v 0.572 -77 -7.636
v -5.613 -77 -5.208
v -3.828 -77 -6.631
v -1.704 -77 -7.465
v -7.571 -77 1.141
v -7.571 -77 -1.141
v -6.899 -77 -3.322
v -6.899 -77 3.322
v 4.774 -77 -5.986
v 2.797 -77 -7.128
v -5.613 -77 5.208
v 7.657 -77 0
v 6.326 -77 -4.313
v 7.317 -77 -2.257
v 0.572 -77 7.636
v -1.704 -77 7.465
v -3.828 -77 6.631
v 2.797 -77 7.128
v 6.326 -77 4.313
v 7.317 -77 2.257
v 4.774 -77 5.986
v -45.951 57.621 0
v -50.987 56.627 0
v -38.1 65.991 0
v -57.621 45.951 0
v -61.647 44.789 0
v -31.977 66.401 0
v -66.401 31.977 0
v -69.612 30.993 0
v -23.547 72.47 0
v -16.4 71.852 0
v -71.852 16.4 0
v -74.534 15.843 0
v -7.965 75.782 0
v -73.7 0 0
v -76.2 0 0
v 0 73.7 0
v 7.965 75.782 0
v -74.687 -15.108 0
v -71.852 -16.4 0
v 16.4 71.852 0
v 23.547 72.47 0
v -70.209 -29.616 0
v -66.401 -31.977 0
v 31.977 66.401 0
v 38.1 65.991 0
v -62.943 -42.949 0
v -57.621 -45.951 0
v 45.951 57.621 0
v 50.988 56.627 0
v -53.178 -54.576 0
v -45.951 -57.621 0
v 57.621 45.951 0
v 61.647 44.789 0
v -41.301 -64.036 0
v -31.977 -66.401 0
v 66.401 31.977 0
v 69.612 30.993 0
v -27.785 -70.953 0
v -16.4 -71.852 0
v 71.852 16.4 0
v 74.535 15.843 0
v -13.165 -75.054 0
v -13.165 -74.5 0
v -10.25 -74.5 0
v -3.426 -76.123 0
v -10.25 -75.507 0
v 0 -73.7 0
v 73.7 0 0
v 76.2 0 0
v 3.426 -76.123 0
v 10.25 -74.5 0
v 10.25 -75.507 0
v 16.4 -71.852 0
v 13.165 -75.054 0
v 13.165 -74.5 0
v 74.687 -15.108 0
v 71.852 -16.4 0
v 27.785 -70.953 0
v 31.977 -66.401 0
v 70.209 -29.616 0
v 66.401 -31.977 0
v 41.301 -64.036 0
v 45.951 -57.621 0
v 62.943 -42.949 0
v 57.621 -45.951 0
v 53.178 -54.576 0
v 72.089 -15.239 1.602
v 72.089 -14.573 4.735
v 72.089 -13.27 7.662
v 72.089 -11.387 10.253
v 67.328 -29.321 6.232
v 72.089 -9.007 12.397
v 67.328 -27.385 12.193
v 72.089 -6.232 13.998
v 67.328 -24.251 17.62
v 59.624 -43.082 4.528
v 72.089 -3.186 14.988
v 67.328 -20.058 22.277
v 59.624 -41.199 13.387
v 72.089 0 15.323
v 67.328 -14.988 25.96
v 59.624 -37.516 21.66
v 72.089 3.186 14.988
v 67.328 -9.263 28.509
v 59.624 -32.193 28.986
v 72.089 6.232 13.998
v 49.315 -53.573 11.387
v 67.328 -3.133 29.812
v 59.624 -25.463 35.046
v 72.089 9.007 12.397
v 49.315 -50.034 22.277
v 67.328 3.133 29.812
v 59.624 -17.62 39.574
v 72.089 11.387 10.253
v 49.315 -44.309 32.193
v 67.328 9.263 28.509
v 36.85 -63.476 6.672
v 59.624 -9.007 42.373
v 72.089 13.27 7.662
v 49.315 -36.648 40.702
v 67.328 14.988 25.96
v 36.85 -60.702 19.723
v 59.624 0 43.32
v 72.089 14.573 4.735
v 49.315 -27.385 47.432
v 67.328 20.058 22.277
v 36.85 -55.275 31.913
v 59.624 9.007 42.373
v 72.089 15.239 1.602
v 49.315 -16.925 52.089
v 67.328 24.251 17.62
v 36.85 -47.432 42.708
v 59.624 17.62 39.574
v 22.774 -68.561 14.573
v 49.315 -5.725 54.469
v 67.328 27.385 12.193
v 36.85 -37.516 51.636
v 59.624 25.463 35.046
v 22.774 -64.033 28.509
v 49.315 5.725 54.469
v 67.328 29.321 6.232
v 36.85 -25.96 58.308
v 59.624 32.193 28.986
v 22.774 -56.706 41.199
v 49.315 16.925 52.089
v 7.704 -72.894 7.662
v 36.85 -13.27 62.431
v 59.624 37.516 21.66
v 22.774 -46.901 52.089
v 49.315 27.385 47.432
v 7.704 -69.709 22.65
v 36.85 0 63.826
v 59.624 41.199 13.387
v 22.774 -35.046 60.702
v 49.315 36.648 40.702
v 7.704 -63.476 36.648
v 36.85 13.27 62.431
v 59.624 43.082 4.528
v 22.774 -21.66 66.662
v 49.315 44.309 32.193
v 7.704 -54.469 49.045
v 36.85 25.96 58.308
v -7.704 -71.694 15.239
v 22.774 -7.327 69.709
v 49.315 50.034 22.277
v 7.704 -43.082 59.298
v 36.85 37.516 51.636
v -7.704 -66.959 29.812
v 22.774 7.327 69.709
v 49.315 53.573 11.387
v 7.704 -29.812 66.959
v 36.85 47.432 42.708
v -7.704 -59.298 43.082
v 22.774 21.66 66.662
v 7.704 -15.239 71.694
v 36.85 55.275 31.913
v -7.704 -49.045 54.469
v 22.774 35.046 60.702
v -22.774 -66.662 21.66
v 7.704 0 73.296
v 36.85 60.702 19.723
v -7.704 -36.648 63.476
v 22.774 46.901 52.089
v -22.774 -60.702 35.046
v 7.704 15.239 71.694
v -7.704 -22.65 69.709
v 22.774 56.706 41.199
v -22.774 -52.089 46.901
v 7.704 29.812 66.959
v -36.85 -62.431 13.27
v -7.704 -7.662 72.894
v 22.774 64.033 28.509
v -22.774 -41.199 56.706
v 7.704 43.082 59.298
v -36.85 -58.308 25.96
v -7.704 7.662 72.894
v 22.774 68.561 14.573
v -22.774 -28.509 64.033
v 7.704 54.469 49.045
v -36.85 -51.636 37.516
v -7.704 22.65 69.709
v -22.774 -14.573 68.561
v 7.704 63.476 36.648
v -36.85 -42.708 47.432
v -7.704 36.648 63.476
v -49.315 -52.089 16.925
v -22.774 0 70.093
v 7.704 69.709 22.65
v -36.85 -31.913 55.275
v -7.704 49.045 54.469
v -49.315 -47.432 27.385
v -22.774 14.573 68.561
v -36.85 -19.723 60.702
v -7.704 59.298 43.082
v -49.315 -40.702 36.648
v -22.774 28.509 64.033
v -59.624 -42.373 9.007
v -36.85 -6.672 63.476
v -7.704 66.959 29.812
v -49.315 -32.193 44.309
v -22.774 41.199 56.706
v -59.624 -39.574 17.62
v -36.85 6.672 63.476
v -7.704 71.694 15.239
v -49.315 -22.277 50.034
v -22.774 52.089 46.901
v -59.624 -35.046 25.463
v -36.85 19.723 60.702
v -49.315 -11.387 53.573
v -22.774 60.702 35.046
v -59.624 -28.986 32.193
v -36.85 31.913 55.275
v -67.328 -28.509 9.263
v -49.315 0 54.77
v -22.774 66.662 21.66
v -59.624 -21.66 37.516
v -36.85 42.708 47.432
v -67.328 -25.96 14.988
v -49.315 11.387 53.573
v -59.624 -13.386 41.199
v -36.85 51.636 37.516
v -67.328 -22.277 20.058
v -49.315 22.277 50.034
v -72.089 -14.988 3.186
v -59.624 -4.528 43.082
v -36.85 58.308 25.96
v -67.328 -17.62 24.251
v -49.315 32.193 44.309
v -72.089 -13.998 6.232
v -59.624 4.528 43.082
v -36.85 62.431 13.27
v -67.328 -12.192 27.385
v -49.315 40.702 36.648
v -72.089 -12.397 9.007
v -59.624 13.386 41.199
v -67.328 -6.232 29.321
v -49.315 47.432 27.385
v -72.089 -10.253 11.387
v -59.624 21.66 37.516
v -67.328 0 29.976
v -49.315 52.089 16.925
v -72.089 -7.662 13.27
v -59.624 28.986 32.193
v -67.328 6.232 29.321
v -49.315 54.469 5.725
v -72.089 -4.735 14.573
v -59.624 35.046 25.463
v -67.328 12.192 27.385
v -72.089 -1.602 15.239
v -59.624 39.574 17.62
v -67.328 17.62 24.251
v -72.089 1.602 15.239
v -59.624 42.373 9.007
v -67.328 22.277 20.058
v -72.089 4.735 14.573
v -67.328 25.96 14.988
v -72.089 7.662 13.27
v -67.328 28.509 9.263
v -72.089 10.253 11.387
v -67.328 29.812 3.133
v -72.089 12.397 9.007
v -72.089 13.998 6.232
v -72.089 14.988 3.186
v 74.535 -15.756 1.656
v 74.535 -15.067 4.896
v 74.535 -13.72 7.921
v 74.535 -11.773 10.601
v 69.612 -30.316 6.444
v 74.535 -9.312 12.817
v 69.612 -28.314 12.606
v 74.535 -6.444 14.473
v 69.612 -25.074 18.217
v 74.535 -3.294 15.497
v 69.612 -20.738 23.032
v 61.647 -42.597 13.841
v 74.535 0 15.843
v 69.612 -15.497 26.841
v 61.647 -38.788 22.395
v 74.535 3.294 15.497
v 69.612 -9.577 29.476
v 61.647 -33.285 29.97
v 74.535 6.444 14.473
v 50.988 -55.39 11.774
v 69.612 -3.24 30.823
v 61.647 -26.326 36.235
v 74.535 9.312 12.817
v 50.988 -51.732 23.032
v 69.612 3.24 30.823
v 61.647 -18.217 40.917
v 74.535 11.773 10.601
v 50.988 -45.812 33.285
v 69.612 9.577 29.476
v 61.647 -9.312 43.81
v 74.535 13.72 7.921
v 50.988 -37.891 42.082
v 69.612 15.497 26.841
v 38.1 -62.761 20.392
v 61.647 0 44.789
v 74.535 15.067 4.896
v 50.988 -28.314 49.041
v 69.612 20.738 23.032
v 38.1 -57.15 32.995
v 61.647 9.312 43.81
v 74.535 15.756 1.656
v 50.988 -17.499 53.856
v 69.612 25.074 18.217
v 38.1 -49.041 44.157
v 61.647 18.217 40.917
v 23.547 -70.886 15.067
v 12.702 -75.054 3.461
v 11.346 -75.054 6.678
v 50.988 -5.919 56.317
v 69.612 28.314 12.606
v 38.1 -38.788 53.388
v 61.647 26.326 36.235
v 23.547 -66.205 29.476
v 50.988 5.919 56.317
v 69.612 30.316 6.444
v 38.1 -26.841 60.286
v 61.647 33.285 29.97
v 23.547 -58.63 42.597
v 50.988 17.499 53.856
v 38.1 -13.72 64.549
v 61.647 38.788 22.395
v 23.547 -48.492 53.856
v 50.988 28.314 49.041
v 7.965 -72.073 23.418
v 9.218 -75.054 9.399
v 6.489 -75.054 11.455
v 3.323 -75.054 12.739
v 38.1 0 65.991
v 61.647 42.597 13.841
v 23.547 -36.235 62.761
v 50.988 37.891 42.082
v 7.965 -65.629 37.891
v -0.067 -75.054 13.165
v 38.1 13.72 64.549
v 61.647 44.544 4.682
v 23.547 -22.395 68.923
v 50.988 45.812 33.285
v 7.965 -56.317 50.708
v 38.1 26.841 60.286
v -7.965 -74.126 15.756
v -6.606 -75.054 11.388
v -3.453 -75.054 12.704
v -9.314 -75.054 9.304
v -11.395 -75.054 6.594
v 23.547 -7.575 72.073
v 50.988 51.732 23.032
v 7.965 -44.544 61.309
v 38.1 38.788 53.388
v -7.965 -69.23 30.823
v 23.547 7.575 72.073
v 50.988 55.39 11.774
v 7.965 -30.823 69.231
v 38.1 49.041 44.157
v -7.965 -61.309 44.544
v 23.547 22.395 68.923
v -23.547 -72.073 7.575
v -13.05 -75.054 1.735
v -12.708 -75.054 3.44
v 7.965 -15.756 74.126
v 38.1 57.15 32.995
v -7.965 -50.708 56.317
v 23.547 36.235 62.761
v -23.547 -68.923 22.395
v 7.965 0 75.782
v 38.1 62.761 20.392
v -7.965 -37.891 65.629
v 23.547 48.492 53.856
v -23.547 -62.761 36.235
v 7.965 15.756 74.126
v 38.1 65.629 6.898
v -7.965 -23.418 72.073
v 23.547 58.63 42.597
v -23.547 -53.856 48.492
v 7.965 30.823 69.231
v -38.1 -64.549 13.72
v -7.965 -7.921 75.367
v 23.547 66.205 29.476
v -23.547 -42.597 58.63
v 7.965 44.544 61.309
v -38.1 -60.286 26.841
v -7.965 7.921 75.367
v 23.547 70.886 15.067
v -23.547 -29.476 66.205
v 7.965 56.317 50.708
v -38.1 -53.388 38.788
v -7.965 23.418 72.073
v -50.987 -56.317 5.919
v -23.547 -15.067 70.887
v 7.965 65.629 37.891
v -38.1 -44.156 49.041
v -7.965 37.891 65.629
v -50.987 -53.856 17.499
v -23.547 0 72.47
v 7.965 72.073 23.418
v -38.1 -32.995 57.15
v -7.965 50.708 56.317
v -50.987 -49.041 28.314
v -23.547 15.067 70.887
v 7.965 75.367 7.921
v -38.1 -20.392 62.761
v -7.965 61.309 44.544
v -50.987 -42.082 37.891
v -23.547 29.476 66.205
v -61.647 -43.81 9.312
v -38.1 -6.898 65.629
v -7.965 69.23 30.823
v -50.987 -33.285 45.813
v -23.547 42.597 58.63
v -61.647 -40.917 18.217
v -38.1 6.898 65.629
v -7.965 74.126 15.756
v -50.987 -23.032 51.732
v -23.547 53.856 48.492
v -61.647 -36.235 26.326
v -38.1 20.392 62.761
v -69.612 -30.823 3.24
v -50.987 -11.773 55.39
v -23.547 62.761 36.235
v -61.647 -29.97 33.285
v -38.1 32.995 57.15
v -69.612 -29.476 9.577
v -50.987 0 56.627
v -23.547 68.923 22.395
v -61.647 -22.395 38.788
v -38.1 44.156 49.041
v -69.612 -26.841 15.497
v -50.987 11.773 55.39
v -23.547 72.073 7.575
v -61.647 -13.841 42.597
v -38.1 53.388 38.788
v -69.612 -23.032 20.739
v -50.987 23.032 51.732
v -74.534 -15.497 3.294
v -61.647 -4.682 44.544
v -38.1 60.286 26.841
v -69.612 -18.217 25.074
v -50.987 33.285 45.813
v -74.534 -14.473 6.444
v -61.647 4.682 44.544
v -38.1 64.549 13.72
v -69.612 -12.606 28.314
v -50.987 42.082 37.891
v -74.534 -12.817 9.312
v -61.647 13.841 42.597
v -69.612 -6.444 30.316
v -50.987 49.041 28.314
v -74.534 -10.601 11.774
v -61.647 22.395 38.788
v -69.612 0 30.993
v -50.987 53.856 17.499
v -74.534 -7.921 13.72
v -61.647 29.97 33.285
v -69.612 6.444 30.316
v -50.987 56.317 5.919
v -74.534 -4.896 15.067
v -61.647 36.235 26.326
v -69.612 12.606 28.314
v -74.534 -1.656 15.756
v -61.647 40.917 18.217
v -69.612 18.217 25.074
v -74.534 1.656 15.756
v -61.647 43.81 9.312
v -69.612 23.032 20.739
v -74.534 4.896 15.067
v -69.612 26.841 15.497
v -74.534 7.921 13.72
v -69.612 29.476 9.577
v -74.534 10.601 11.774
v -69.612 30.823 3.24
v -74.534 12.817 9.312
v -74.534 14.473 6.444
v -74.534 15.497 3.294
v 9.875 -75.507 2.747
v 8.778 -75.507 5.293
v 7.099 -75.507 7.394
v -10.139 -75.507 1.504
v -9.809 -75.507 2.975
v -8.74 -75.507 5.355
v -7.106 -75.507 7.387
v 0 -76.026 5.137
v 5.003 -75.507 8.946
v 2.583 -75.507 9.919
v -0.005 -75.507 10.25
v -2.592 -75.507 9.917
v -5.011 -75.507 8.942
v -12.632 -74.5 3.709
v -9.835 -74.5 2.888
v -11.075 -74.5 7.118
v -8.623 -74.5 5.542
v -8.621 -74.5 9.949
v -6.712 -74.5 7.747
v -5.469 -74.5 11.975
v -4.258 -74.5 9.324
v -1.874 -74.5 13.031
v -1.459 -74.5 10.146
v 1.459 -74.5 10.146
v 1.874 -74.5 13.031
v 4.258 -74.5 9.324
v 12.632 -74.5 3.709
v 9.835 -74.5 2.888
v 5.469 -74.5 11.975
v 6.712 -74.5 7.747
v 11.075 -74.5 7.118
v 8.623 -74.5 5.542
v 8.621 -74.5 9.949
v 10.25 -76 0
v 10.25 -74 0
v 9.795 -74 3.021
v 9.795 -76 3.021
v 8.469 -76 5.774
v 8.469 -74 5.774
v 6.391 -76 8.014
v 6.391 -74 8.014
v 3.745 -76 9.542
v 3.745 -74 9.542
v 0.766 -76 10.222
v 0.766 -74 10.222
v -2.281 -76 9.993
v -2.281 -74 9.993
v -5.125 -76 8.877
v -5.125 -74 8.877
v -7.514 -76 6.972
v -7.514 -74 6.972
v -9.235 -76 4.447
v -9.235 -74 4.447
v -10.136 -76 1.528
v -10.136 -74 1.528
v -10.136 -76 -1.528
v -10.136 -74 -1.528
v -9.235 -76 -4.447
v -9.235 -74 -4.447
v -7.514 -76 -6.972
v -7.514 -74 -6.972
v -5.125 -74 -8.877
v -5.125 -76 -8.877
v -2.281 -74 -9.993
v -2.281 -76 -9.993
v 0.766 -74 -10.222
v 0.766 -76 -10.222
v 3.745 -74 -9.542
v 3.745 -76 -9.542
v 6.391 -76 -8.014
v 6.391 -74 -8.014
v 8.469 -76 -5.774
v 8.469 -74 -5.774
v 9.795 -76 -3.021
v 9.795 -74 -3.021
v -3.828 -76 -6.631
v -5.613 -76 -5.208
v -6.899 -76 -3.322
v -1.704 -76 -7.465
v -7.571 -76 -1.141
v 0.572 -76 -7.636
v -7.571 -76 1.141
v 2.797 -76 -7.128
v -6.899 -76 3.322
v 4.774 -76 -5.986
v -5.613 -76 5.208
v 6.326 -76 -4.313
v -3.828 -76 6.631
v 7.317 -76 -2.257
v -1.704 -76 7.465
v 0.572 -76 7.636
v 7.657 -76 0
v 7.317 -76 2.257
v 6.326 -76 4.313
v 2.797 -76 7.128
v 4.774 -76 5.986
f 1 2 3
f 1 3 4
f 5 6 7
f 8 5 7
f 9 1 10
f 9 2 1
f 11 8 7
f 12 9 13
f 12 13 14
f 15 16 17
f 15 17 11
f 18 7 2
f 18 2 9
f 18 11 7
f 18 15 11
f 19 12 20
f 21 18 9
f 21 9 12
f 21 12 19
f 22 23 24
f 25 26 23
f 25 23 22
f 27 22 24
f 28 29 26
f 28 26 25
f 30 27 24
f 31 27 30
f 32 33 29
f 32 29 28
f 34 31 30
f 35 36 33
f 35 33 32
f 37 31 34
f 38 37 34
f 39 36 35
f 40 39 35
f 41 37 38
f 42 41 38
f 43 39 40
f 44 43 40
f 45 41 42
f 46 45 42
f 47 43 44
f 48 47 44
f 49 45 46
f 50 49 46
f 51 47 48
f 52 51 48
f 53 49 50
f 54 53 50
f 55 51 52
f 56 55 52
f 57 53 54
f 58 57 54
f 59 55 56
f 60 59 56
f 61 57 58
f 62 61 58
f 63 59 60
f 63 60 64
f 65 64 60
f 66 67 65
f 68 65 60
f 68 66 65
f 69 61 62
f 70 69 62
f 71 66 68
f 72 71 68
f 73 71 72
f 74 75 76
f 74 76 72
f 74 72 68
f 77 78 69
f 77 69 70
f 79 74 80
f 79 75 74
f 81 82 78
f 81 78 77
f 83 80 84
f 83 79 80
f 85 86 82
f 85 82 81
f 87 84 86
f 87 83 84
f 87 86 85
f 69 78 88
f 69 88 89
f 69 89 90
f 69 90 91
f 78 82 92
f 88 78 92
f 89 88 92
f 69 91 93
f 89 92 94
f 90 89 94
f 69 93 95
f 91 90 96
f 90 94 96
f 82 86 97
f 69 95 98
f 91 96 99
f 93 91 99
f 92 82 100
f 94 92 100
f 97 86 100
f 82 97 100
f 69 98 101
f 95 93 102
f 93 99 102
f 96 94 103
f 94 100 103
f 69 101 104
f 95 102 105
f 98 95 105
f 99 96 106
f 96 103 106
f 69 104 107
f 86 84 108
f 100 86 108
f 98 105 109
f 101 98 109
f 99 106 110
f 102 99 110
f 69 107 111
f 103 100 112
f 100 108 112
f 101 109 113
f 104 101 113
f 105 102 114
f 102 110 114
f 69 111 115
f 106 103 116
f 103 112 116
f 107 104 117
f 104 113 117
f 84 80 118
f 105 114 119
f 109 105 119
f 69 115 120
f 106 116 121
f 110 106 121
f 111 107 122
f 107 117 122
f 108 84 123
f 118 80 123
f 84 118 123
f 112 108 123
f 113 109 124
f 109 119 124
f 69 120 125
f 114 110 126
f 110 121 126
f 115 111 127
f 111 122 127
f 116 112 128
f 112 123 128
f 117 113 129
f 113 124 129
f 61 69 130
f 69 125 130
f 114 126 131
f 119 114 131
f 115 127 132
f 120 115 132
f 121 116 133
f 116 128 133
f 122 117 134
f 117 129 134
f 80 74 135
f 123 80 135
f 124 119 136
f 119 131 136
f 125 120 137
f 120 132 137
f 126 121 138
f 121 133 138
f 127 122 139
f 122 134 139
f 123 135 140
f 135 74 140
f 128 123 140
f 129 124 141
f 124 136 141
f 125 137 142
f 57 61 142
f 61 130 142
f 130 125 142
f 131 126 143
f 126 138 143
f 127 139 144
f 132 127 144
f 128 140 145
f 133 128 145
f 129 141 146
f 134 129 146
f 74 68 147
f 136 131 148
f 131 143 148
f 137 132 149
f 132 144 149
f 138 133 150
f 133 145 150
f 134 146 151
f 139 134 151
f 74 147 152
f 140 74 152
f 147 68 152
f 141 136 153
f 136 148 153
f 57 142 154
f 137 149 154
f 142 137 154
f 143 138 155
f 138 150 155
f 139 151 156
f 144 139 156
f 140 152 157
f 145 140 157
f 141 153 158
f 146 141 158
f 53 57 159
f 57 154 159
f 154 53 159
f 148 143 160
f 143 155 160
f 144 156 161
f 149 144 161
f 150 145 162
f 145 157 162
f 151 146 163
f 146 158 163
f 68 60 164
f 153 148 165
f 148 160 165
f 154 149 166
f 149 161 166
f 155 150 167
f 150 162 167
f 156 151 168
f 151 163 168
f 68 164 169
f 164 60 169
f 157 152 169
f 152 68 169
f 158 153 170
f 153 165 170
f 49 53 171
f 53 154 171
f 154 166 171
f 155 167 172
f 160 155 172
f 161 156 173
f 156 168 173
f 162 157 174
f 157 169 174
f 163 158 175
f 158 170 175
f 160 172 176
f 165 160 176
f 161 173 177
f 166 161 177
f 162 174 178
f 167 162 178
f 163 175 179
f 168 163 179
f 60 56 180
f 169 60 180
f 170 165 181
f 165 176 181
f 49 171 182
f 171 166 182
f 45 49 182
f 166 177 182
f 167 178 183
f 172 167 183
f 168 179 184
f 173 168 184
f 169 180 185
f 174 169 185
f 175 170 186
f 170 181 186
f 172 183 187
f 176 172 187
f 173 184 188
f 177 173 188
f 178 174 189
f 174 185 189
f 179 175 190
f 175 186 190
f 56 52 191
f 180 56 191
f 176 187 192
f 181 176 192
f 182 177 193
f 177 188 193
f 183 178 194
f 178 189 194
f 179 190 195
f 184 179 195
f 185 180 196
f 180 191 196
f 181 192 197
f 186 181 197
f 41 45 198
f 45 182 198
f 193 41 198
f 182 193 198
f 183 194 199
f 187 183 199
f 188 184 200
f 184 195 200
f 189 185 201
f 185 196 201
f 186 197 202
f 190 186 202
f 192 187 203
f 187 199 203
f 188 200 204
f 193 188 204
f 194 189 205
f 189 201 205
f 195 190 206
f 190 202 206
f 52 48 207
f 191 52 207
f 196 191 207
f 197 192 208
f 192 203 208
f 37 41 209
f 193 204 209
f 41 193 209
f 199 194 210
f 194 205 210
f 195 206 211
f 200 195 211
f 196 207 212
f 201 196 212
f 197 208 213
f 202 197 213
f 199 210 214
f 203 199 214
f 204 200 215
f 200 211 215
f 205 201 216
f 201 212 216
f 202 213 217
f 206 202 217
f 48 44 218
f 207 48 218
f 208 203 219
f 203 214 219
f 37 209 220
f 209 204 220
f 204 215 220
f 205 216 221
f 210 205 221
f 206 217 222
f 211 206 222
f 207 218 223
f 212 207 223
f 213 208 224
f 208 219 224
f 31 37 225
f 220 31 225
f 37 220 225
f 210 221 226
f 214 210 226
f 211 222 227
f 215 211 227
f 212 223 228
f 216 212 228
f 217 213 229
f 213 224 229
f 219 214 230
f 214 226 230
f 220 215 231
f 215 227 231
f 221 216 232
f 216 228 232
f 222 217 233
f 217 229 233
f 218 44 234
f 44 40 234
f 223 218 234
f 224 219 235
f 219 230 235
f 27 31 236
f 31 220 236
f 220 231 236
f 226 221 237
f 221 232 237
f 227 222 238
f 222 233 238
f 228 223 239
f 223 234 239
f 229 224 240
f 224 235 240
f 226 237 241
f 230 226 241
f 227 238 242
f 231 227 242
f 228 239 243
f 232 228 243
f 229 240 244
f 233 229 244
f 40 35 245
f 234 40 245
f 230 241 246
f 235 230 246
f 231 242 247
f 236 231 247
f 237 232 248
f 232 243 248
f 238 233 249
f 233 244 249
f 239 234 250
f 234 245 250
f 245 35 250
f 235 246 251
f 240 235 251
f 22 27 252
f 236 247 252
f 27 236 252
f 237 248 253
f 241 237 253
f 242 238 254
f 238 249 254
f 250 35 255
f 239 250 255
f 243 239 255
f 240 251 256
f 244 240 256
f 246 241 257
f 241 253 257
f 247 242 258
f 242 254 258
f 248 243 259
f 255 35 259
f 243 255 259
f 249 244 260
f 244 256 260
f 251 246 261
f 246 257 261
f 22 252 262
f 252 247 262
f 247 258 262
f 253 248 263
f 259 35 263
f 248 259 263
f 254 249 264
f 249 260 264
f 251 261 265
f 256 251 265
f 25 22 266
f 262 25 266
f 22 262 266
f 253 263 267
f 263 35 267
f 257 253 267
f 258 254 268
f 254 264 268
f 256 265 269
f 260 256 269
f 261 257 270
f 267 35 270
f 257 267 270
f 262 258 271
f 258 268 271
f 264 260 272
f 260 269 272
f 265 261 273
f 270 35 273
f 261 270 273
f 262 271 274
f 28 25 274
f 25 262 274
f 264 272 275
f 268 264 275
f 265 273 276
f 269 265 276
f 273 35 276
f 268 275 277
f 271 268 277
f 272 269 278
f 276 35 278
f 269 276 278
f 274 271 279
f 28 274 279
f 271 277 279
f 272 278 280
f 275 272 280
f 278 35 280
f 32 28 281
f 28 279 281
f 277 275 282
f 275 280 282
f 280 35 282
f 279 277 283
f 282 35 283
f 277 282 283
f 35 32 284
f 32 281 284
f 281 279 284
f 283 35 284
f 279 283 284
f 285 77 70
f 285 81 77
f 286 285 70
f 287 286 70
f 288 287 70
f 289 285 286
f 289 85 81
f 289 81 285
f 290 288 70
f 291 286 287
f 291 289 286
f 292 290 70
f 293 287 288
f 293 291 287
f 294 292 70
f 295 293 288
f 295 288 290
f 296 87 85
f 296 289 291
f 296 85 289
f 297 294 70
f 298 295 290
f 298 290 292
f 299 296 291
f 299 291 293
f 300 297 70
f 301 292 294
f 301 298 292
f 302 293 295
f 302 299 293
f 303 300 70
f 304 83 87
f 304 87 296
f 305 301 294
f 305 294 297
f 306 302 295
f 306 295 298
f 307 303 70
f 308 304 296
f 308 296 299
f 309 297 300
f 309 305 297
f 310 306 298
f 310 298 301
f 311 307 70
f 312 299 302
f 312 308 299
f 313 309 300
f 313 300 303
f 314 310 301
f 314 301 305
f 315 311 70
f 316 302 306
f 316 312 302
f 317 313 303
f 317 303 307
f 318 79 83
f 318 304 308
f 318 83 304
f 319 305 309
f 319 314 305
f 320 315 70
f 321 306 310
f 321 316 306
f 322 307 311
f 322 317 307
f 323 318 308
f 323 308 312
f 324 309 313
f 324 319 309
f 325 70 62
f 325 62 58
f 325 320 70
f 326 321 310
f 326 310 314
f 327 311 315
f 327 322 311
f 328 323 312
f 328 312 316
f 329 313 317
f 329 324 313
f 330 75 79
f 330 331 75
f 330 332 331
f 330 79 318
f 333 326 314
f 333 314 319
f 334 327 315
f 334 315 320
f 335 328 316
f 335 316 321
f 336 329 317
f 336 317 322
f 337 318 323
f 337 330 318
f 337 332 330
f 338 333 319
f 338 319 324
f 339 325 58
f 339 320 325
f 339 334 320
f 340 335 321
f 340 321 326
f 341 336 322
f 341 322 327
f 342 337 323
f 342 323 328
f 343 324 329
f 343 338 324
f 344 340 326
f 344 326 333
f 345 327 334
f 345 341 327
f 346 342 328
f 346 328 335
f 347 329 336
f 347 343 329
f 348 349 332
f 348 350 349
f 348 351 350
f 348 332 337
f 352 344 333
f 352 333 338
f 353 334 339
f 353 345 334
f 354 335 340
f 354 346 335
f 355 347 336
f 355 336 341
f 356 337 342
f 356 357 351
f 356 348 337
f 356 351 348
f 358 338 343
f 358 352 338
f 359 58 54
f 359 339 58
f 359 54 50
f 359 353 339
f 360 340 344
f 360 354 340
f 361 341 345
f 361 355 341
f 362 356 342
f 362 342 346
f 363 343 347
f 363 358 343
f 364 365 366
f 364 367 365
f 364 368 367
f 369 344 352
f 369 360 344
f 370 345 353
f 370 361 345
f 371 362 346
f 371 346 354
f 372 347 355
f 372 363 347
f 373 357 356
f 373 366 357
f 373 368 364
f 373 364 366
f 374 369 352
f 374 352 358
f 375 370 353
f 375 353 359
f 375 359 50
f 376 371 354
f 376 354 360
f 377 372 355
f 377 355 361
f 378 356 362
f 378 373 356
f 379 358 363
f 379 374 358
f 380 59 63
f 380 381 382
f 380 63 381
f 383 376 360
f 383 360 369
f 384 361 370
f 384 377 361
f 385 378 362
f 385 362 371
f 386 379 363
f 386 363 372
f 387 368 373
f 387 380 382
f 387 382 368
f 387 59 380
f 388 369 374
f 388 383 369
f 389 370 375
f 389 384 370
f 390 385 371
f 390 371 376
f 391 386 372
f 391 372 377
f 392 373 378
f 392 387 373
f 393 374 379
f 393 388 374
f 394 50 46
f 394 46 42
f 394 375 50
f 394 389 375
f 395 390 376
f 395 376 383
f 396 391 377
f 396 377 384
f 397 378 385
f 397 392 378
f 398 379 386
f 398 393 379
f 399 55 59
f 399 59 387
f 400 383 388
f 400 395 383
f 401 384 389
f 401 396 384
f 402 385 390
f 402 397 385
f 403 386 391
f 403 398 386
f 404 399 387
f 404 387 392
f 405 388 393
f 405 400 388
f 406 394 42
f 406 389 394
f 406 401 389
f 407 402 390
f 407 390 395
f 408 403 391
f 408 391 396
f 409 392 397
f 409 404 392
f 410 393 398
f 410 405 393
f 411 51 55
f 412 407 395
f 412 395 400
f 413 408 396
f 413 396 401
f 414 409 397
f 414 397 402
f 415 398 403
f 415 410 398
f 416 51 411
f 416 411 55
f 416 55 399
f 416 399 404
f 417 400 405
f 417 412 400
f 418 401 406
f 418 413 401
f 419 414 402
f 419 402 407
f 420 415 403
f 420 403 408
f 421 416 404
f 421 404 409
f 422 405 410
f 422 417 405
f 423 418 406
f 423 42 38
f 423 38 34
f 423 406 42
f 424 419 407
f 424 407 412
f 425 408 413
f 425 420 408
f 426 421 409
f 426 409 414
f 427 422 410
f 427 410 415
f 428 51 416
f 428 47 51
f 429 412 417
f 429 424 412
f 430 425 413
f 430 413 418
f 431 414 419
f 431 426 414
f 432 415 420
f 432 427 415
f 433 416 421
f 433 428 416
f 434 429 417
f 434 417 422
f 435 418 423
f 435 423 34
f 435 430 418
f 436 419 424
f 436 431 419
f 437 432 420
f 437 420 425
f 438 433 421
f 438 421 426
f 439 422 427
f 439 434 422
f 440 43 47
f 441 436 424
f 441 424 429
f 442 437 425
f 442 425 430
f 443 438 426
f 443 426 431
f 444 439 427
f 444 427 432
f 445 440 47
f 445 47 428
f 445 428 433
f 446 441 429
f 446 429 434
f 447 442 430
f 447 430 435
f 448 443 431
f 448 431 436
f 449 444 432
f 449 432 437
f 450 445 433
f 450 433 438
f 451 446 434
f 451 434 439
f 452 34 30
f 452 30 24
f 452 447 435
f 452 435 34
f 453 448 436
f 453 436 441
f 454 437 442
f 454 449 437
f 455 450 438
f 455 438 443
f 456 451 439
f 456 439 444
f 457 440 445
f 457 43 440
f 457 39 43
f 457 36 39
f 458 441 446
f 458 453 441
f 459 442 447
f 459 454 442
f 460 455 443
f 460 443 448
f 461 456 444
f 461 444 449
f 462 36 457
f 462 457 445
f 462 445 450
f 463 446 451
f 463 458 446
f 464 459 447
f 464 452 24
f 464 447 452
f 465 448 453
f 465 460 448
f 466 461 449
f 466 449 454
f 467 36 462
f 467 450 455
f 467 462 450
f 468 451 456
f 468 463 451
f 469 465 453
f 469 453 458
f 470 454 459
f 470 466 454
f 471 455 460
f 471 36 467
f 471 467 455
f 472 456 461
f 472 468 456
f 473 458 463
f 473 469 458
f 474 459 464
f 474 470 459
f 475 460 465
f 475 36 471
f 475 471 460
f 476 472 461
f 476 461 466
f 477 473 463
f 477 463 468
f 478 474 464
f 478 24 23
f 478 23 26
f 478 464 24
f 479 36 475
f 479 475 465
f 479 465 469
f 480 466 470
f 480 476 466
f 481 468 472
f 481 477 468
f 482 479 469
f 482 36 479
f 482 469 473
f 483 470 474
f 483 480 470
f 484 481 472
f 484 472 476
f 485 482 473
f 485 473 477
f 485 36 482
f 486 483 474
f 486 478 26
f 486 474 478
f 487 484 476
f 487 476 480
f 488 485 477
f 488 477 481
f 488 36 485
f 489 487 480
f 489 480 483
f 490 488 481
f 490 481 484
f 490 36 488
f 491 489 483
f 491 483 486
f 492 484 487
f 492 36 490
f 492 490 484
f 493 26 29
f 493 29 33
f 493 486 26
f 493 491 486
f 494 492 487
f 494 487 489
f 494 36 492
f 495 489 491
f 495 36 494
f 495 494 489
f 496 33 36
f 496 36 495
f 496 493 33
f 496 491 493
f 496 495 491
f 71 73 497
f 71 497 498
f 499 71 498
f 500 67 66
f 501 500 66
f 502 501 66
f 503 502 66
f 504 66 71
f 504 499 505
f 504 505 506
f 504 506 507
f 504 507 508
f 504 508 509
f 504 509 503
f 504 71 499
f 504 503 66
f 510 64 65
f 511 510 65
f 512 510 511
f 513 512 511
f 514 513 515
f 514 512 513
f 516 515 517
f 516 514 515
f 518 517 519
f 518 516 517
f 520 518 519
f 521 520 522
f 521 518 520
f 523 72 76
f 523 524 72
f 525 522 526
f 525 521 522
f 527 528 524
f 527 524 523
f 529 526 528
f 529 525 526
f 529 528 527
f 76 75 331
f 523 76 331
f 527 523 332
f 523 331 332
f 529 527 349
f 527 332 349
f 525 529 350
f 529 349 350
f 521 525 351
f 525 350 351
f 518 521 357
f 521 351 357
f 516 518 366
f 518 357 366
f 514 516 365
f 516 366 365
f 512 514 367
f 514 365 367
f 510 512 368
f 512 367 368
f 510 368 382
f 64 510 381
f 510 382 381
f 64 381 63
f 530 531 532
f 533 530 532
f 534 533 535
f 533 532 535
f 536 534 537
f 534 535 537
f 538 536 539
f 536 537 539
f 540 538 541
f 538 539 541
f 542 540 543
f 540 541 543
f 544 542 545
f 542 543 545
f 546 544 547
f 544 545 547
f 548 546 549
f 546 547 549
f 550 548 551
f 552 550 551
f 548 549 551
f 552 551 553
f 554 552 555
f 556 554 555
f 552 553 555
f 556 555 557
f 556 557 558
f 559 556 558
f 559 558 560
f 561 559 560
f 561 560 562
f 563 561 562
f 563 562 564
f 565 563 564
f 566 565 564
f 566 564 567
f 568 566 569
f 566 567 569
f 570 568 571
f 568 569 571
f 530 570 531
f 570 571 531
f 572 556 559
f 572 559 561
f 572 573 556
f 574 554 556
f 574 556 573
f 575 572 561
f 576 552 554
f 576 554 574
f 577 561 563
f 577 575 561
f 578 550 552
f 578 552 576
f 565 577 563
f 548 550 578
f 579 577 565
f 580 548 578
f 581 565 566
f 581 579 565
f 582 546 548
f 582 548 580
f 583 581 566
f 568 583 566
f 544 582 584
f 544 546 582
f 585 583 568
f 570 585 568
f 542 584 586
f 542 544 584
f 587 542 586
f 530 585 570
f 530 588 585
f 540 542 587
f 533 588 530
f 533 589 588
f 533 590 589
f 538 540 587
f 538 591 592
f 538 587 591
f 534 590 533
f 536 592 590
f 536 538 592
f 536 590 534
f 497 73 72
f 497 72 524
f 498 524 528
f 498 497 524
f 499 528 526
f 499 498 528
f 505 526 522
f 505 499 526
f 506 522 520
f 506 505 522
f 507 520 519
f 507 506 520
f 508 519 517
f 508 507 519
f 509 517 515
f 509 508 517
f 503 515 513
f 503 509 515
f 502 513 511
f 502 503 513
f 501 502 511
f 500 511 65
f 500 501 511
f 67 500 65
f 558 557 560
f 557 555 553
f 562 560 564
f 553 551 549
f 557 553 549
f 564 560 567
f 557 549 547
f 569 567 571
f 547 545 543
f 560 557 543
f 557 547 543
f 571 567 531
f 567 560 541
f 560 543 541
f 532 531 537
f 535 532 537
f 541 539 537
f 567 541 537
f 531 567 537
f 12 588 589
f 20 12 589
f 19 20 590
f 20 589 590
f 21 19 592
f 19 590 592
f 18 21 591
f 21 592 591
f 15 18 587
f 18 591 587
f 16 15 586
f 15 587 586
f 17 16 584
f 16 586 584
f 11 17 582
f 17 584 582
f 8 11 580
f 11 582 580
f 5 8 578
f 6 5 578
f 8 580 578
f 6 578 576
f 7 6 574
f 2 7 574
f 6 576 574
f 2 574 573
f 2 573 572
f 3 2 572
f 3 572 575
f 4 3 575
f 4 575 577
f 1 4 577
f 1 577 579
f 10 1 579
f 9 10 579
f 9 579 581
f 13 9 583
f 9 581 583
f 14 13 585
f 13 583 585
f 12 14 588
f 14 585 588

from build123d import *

# Parameters (mm, degrees)
F1_ANGLE_BACK = 90
F1_ANGLE      = 180
F2_T          = -2.5
F3_R          = 10.2502002621
F4_DEPTH      = 74
F5_R          = 10.2502002621
F6_DEPTH      = 2
F7_R          = 7.6569283782
F8_DEPTH      = 1
F9_R          = 13.1650380961
F9_R_2        = 10.2502002621
F10_DEPTH     = 1.5


# Not quite as in the source:
# - ends of sketch curves that miss each other by under 0.0002 mm in the source are joined


with BuildPart() as f1:
    # F0 (on Front) → F1 (revolve)
    with BuildSketch(Plane.XZ, mode=Mode.PRIVATE) as f1_sk:
        with BuildLine():
            ThreePointArc((76.1996501387, 4.35119e-05), (3.66272e-05, 76.1996570235), (-76.1995768844, 4.35119e-05))
            Line((-76.1995768844, 4.35119e-05), (76.1996501387, 4.35119e-05))
        make_face()
    revolve(f1_sk.sketch.rotate(Axis((8.50559e-05, 0, 4.35119e-05), (-1, 0, 0)), -F1_ANGLE_BACK), axis=Axis((8.50559e-05, 0, 4.35119e-05), (-1, 0, 0)), revolution_arc=F1_ANGLE)

    # F2
    f2_openings = [f1.faces().sort_by_distance(p)[0] for p in [
        (3.7e-05, 0, 4.4e-05),
    ]]
    offset(amount=F2_T, openings=f2_openings)

    # F9 (on face) → F10 (cut)
    with BuildSketch(Plane.XZ.offset(76)):
        Circle(F9_R)
        Circle(F9_R_2, mode=Mode.SUBTRACT)
    extrude(amount=-F10_DEPTH, mode=Mode.SUBTRACT)


with BuildPart() as f4:
    # F3 (on Front) → F4 (new body)
    with BuildSketch(Plane.XZ):
        Circle(F3_R)
    extrude(amount=F4_DEPTH)


with BuildPart() as f6:
    # F5 (on face) → F6 (new body)
    with BuildSketch(Plane.XZ.offset(74)):
        Circle(F5_R)
    extrude(amount=F6_DEPTH)

    # F7 (on face) → F8 (join)
    with BuildSketch(Plane.XZ.offset(76)):
        Circle(F7_R)
    extrude(amount=F8_DEPTH)


solid = Compound([f1.part, f6.part])
